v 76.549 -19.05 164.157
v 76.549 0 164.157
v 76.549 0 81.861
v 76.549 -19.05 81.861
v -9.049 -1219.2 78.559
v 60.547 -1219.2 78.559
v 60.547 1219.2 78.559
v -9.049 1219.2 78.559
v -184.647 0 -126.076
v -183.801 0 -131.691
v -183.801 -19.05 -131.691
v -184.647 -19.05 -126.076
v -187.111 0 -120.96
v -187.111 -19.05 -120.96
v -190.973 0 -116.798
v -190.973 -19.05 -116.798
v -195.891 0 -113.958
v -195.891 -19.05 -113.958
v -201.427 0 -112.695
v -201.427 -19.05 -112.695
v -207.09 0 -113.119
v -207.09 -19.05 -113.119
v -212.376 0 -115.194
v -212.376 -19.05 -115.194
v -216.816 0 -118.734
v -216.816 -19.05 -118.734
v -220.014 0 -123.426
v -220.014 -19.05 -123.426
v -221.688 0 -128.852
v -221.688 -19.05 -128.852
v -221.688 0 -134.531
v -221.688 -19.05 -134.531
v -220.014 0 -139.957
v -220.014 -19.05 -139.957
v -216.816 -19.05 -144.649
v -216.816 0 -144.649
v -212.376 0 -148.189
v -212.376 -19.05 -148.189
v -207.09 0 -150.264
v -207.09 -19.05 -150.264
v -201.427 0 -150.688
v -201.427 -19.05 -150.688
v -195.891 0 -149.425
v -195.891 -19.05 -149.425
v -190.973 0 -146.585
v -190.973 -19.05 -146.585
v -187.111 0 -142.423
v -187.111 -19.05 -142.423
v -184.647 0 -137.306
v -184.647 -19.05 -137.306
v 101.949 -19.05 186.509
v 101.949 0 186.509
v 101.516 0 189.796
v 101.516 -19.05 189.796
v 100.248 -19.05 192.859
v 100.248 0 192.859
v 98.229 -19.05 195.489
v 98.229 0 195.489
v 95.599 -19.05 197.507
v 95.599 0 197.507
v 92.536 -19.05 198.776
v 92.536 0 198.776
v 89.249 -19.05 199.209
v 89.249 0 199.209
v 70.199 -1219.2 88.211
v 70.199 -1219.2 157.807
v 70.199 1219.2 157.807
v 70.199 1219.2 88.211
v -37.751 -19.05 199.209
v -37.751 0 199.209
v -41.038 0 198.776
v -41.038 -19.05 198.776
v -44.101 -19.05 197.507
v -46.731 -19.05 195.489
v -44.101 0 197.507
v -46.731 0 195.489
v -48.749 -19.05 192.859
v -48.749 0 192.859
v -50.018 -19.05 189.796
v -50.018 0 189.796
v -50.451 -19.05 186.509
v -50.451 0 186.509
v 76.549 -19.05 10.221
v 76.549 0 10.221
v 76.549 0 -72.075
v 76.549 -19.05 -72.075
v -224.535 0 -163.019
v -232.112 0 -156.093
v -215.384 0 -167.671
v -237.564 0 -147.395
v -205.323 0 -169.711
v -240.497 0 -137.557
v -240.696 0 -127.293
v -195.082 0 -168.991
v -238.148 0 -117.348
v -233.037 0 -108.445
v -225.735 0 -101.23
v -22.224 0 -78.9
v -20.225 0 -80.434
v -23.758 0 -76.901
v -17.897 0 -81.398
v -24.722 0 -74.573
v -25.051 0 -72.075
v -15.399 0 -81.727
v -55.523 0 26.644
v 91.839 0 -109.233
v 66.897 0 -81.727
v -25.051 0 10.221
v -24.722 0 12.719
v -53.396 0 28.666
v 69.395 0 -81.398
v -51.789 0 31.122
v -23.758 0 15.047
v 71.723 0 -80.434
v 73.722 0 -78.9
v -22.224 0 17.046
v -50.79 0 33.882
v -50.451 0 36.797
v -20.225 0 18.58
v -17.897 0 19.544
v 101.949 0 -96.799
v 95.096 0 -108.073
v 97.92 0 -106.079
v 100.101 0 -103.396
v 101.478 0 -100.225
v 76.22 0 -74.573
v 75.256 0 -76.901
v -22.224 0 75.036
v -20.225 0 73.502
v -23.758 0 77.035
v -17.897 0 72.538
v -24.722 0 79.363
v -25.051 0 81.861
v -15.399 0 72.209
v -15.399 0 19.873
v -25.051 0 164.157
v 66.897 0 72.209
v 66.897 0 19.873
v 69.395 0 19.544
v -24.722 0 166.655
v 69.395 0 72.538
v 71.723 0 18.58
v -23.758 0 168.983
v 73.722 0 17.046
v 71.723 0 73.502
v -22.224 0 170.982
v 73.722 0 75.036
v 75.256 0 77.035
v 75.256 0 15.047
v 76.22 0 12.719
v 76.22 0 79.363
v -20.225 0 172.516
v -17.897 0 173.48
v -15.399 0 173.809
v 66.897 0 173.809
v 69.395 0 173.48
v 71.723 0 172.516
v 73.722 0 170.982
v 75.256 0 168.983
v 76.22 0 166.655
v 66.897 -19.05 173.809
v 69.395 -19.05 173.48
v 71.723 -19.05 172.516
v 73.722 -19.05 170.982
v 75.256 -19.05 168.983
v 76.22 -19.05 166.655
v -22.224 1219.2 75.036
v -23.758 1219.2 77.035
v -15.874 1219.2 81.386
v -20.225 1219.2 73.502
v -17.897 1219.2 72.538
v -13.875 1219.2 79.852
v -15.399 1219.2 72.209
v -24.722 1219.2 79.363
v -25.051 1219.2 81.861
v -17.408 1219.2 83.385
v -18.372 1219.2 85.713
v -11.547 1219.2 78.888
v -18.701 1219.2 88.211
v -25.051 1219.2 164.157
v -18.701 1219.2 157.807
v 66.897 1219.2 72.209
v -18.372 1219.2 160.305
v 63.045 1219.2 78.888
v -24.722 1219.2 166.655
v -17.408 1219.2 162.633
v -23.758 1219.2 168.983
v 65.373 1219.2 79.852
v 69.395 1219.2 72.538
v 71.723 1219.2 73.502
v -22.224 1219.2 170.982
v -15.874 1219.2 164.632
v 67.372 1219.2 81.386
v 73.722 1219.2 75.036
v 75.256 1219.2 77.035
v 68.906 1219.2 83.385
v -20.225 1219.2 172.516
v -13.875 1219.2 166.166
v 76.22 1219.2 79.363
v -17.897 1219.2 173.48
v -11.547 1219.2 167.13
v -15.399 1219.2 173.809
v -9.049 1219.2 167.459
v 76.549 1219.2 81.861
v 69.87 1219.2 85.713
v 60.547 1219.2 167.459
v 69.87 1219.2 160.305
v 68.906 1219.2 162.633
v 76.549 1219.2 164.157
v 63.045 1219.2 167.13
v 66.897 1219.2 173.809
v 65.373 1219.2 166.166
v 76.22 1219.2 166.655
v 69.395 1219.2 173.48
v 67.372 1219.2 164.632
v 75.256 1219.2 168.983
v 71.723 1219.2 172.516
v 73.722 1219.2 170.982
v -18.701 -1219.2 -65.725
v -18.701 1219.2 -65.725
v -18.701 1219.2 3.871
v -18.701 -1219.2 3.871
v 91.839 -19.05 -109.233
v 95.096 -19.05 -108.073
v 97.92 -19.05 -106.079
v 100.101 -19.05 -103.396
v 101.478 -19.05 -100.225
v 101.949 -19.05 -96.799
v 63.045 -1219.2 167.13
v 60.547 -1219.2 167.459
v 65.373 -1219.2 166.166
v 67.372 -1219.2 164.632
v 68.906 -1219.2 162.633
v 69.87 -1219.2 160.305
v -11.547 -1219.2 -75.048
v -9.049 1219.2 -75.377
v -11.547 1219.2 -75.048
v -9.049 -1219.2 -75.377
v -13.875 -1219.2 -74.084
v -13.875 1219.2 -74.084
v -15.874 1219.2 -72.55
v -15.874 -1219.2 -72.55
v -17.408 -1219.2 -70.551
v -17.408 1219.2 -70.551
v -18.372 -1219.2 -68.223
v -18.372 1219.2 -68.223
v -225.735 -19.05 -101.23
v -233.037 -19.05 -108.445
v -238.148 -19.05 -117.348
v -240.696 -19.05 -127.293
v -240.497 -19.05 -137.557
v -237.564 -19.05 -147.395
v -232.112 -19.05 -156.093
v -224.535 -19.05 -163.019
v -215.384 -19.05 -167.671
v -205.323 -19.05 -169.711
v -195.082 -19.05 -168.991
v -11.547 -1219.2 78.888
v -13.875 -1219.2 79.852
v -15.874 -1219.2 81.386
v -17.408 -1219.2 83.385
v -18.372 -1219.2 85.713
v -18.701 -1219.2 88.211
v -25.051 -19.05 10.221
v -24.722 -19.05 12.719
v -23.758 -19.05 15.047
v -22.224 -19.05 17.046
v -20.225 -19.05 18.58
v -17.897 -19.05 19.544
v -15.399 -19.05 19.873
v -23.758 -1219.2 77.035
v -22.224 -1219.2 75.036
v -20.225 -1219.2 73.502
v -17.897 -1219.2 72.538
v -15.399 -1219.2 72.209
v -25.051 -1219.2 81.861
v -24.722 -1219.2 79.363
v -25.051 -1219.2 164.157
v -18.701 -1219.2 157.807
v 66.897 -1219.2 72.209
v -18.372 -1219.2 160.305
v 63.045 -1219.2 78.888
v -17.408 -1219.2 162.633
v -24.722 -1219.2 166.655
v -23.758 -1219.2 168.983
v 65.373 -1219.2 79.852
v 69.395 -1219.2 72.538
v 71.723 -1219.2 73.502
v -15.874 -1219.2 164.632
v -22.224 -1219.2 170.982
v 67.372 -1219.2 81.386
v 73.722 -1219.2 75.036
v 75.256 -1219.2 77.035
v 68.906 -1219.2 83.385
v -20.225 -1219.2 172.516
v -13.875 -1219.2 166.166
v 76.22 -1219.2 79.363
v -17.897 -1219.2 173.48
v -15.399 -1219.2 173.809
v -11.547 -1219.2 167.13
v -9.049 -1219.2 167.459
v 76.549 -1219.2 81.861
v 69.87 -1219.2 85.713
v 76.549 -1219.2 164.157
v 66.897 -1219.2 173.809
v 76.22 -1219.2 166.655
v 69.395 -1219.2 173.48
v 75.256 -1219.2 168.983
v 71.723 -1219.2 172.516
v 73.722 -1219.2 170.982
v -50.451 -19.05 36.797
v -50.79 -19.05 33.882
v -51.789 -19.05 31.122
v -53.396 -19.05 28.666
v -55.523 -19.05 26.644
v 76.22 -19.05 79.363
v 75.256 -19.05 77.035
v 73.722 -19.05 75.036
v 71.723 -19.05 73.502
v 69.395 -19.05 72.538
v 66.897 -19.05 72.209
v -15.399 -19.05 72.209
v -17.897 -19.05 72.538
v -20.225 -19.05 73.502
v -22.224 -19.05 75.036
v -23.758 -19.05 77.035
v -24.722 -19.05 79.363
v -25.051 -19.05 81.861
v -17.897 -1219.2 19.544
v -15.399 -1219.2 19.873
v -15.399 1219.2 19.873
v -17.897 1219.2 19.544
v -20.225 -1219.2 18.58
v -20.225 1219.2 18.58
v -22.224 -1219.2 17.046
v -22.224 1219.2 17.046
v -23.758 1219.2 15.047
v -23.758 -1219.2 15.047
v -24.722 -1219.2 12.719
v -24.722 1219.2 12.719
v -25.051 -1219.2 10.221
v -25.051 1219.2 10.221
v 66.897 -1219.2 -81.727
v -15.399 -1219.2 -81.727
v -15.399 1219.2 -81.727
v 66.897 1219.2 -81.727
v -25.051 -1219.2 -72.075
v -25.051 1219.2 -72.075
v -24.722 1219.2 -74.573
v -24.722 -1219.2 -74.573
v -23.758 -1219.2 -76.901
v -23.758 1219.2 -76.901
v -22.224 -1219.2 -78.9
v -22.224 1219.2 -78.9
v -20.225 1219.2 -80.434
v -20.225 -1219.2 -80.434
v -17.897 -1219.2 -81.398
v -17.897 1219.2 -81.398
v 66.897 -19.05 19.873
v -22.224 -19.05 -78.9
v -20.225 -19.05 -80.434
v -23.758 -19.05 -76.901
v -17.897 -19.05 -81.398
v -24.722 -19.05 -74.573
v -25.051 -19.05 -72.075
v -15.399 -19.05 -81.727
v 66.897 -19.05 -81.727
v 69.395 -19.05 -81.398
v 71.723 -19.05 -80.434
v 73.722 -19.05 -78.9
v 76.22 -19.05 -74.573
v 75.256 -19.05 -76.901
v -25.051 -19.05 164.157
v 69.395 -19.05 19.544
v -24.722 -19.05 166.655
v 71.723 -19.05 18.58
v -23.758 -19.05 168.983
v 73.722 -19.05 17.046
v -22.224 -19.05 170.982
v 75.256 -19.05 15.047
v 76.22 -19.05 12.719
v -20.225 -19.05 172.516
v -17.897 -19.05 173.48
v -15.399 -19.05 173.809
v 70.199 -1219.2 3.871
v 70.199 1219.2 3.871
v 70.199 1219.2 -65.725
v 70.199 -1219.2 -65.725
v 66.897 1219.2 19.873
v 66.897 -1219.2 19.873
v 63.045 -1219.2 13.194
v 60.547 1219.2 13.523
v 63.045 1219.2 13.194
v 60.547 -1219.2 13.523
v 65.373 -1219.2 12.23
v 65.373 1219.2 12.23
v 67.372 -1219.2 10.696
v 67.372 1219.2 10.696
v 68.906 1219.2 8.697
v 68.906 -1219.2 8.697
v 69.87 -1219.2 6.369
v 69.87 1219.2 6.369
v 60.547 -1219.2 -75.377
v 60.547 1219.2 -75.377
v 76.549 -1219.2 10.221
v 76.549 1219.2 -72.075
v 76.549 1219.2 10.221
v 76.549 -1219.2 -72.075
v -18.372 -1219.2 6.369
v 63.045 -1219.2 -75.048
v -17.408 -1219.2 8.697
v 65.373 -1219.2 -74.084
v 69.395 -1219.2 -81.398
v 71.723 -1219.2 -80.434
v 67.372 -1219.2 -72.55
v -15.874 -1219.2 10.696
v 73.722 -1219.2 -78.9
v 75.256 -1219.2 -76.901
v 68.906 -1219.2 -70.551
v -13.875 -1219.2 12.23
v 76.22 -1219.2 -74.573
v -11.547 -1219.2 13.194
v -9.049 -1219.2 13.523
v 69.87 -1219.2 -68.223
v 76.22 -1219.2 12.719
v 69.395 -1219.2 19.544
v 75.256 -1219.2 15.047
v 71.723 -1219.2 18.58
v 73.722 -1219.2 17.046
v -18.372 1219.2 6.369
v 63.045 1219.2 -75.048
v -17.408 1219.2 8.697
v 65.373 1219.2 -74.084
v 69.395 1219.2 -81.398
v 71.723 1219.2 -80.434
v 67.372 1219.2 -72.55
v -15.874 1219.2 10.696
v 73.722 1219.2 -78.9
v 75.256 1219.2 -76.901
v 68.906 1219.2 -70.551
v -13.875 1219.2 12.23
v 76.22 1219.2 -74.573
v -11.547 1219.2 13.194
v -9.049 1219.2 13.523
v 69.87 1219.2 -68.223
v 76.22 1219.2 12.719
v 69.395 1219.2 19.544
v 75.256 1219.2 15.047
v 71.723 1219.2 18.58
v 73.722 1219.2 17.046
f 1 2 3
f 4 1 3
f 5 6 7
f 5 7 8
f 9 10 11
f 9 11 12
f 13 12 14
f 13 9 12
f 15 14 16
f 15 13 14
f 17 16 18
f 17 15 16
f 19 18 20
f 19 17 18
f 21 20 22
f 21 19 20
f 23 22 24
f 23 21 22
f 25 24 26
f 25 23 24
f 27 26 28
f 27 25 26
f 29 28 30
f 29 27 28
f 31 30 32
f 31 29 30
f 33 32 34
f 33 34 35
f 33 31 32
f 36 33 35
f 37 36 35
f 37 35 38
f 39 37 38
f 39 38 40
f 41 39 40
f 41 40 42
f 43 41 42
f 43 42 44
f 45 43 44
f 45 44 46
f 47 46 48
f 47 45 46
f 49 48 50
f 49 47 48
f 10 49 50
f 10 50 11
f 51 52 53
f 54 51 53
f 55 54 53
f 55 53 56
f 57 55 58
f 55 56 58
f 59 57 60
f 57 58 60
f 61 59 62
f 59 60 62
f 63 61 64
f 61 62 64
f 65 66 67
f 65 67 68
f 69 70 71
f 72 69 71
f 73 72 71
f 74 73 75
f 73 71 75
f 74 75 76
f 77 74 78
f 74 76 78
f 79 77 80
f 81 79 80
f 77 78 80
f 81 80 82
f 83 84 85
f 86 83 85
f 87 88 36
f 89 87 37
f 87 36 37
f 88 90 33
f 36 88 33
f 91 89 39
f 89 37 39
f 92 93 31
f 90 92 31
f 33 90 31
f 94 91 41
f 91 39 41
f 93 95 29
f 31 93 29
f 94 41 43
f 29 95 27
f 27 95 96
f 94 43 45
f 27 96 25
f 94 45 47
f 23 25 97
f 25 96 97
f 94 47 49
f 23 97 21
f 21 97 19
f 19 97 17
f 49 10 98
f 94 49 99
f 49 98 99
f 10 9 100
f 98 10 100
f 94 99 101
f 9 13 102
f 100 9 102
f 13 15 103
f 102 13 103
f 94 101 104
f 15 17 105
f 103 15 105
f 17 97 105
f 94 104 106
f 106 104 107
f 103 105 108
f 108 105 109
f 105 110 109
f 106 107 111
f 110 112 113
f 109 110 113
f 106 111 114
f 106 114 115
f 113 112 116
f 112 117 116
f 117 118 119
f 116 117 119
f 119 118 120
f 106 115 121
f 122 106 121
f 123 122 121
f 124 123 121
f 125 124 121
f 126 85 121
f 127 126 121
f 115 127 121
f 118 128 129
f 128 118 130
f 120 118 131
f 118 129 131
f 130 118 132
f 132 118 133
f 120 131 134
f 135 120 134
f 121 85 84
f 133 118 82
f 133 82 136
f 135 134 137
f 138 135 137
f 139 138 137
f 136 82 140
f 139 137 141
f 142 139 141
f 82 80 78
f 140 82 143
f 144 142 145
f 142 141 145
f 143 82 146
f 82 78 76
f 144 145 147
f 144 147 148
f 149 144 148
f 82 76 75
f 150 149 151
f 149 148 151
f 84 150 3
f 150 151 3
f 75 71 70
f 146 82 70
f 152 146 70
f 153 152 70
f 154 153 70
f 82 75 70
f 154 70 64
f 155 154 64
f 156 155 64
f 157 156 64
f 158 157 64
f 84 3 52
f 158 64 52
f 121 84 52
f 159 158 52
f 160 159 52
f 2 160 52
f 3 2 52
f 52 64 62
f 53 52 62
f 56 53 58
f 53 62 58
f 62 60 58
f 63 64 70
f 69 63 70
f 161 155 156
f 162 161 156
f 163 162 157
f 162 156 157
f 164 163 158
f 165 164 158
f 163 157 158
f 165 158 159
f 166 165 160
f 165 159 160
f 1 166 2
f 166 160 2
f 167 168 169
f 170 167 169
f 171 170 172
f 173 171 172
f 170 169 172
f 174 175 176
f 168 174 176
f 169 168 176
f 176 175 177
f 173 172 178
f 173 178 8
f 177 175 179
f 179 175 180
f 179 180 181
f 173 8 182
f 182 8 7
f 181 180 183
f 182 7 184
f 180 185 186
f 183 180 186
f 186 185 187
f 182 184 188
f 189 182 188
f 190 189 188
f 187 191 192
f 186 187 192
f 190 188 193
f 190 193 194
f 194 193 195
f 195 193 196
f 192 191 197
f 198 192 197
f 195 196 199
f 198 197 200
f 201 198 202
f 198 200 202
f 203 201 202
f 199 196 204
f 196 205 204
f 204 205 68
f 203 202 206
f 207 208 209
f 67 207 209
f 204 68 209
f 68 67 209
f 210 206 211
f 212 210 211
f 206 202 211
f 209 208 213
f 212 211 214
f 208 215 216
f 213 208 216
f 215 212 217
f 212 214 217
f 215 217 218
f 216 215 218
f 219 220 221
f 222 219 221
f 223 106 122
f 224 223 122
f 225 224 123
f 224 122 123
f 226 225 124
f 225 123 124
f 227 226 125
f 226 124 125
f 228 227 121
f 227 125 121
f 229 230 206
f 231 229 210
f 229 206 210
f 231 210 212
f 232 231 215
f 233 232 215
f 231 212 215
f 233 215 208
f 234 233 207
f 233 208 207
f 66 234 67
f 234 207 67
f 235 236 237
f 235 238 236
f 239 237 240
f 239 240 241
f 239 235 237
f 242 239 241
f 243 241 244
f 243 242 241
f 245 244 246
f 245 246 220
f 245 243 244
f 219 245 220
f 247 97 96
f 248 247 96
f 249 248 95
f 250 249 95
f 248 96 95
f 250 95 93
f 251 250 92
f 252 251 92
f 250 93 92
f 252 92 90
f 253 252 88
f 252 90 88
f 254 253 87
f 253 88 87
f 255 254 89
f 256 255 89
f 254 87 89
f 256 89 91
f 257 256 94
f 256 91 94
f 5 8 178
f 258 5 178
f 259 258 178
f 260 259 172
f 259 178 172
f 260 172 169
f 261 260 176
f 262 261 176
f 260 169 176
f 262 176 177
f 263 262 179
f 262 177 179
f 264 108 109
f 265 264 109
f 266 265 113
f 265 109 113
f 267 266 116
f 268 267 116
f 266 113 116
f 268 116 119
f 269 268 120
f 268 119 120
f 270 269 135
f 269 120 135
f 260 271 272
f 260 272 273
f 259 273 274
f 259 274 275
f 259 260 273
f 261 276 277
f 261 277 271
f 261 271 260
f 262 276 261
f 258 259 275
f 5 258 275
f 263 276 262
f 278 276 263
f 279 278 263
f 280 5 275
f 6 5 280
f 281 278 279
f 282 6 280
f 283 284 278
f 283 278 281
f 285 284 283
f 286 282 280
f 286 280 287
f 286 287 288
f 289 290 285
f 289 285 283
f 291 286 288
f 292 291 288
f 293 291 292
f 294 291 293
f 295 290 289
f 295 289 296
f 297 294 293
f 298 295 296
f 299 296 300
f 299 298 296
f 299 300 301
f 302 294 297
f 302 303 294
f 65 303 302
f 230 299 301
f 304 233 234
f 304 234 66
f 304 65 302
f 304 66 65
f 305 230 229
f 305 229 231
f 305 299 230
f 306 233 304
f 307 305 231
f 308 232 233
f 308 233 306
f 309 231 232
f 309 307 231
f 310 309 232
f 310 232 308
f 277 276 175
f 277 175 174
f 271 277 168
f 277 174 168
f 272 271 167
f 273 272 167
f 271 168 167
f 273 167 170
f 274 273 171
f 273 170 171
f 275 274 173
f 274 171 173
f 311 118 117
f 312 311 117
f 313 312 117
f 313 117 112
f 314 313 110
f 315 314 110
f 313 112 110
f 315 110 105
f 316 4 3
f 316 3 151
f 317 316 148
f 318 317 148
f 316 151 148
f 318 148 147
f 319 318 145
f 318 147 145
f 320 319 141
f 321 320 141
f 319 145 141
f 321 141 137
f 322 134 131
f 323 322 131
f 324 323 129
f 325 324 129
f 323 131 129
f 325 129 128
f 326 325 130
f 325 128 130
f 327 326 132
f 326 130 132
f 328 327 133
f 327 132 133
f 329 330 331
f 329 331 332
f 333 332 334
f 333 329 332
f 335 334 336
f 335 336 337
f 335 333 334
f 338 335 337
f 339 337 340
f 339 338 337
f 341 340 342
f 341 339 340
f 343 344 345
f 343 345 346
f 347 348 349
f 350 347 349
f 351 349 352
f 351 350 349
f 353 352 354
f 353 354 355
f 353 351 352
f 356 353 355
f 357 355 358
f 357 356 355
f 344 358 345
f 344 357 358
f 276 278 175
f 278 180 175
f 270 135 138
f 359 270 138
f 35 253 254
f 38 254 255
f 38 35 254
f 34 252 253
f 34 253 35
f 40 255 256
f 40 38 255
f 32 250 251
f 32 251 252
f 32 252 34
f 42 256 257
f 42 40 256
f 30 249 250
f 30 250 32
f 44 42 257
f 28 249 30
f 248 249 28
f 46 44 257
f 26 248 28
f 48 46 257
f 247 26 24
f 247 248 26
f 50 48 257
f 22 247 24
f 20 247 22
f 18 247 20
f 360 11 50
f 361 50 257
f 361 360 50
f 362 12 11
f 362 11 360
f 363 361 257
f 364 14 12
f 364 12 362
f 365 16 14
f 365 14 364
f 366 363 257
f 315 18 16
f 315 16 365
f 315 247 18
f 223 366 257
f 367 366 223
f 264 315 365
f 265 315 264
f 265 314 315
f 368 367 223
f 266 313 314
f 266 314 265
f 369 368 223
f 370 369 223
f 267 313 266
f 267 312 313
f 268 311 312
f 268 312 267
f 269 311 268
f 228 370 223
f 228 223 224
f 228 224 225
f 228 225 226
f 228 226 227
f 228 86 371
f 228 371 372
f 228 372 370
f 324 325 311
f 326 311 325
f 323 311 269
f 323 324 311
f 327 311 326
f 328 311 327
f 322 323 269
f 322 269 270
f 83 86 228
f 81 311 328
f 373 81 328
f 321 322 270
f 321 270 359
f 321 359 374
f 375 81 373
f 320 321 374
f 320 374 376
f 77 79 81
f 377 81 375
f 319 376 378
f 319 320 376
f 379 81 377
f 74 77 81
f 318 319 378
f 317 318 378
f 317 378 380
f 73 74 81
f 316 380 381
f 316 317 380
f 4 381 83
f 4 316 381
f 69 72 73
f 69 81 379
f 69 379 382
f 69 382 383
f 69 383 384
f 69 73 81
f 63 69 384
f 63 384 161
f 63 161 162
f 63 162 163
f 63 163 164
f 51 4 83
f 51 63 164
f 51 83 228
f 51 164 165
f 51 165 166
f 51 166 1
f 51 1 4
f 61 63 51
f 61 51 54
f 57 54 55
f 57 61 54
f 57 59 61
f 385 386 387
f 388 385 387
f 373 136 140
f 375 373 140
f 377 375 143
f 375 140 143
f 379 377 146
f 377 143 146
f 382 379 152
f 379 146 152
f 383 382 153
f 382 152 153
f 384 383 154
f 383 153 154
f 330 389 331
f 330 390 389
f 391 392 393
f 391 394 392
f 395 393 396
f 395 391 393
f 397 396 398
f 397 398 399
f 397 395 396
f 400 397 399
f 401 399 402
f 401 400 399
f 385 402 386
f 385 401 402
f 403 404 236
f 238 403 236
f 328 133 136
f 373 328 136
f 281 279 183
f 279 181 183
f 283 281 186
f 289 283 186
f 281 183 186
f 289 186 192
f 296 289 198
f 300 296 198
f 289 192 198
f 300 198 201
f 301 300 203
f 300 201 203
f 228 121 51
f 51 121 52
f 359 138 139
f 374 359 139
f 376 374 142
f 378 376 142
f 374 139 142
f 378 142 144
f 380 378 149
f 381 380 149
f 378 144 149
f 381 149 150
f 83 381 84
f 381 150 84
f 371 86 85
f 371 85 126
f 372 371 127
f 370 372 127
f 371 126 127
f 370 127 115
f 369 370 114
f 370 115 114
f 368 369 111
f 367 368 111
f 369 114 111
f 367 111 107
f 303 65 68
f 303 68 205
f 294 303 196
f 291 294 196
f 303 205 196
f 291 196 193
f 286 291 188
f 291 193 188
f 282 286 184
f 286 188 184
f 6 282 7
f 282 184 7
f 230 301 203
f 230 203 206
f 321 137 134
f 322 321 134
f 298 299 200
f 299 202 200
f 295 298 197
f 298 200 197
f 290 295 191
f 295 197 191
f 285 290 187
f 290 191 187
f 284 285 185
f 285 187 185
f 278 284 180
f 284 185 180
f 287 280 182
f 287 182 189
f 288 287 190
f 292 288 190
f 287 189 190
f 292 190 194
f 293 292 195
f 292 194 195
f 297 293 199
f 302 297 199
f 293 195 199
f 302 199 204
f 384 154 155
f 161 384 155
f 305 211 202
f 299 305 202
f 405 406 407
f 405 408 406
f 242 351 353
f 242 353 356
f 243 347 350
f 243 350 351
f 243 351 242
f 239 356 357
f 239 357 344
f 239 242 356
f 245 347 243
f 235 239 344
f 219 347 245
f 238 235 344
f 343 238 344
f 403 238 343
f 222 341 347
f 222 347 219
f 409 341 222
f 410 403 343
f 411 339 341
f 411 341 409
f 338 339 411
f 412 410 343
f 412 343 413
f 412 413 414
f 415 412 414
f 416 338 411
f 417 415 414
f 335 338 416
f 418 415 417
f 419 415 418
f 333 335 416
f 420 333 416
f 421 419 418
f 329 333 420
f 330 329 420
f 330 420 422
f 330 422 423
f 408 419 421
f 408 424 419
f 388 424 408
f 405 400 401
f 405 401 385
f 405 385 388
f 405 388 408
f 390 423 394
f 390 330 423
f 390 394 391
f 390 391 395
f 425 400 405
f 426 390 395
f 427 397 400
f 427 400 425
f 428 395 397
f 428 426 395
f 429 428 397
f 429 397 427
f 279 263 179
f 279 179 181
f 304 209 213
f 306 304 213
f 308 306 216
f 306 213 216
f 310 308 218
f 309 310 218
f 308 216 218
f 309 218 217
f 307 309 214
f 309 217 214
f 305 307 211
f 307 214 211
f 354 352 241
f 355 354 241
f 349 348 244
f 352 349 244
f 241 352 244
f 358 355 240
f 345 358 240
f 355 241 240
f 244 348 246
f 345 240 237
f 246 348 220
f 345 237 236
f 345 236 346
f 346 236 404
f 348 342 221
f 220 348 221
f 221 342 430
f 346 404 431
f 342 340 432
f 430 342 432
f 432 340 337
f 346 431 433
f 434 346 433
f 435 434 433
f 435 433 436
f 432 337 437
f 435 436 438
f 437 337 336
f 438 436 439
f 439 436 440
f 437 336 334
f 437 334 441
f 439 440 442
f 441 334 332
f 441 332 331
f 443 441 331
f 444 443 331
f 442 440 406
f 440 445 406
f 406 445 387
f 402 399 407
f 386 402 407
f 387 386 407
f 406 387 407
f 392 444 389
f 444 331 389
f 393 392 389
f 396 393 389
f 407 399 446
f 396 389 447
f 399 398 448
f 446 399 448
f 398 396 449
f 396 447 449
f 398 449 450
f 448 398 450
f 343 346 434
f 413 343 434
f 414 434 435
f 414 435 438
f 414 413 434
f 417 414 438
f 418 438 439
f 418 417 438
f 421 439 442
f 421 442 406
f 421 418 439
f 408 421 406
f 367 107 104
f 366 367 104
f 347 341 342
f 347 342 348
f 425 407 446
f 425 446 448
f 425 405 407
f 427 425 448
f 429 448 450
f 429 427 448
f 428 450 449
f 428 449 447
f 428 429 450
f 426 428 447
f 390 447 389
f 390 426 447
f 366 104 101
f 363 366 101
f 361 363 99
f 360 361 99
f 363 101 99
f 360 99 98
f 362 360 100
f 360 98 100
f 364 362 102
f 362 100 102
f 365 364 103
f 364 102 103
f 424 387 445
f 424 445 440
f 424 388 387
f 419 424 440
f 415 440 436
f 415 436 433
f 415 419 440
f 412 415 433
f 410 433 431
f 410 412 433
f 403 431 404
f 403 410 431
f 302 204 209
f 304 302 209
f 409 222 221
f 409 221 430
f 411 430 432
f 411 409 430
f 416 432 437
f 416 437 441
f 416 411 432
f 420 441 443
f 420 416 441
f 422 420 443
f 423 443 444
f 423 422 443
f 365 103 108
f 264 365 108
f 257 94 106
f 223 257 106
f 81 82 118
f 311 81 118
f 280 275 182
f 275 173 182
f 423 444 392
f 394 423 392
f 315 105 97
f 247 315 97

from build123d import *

# Parameters (mm, degrees)
F1_DEPTH = 1219.2
F0_R     = 19.05
F2_DEPTH = 19.05


with BuildPart() as f1:
    # F0 (on Front) → F1 (new body, symmetric)
    with BuildSketch(Plane.XZ):
        with BuildLine():
            Line((66.897137, 173.808873), (-15.398863, 173.808873))
            ThreePointArc((-15.398863, 173.808873), (-22.223858, 170.981868), (-25.050863, 164.156873))
            Line((-25.050863, 164.156873), (-25.050863, 81.860873))
            ThreePointArc((-25.050863, 81.860873), (-22.223858, 75.035879), (-15.398863, 72.208873))
            Line((-15.398863, 72.208873), (66.897137, 72.208873))
            ThreePointArc((66.897137, 72.208873), (73.722131, 75.035879), (76.549137, 81.860873))
            Line((76.549137, 81.860873), (76.549137, 164.156873))
            ThreePointArc((76.549137, 164.156873), (73.722131, 170.981868), (66.897137, 173.808873))
        make_face()
        with BuildLine():
            ThreePointArc((-18.700863, 157.806873), (-15.873858, 164.631868), (-9.048863, 167.458873))
            Line((-9.048863, 167.458873), (60.547137, 167.458873))
            ThreePointArc((60.547137, 167.458873), (67.372131, 164.631868), (70.199137, 157.806873))
            Line((70.199137, 157.806873), (70.199137, 88.210873))
            ThreePointArc((70.199137, 88.210873), (67.372131, 81.385879), (60.547137, 78.558873))
            Line((60.547137, 78.558873), (-9.048863, 78.558873))
            ThreePointArc((-9.048863, 78.558873), (-15.873858, 81.385879), (-18.700863, 88.210873))
            Line((-18.700863, 88.210873), (-18.700863, 157.806873))
        make_face(mode=Mode.SUBTRACT)
        with BuildLine():
            Line((66.897137, 19.873195), (-15.398863, 19.873195))
            ThreePointArc((-15.398863, 19.873195), (-22.223858, 17.04619), (-25.050863, 10.221195))
            Line((-25.050863, 10.221195), (-25.050863, -72.074805))
            ThreePointArc((-25.050863, -72.074805), (-22.223858, -78.899799), (-15.398863, -81.726805))
            Line((-15.398863, -81.726805), (66.897137, -81.726805))
            ThreePointArc((66.897137, -81.726805), (73.722131, -78.899799), (76.549137, -72.074805))
            Line((76.549137, -72.074805), (76.549137, 10.221195))
            ThreePointArc((76.549137, 10.221195), (73.722131, 17.04619), (66.897137, 19.873195))
        make_face()
        with BuildLine():
            ThreePointArc((-18.700863, 3.871195), (-15.873858, 10.69619), (-9.048863, 13.523195))
            Line((-9.048863, 13.523195), (60.547137, 13.523195))
            ThreePointArc((60.547137, 13.523195), (67.372131, 10.69619), (70.199137, 3.871195))
            Line((70.199137, 3.871195), (70.199137, -65.724805))
            ThreePointArc((70.199137, -65.724805), (67.372131, -72.549799), (60.547137, -75.376805))
            Line((60.547137, -75.376805), (-9.048863, -75.376805))
            ThreePointArc((-9.048863, -75.376805), (-15.873858, -72.549799), (-18.700863, -65.724805))
            Line((-18.700863, -65.724805), (-18.700863, 3.871195))
        make_face(mode=Mode.SUBTRACT)
    extrude(amount=F1_DEPTH, both=True)


with BuildPart() as f2:
    # F0 (on Front) → F2 (new body)
    with BuildSketch(Plane.XZ):
        with BuildLine():
            Line((89.249137, 199.208873), (-37.750863, 199.208873))
            ThreePointArc((-37.750863, 199.208873), (-46.731119, 195.489129), (-50.450863, 186.508873))
            Line((-50.450863, 186.508873), (-50.450863, 36.797381))
            ThreePointArc((-50.450863, 36.797381), (-51.789357, 31.122332), (-55.522703, 26.643506))
            Line((-55.522703, 26.643506), (-225.735343, -101.229772))
            ThreePointArc((-225.735343, -101.229772), (-237.564236, -147.394637), (-195.082296, -168.990986))
            Line((-195.082296, -168.990986), (91.838659, -109.232563))
            ThreePointArc((91.838659, -109.232563), (99.102485, -104.811953), (101.949137, -96.799367))
            Line((101.949137, -96.799367), (101.949137, 186.508873))
            ThreePointArc((101.949137, 186.508873), (98.229393, 195.489129), (89.249137, 199.208873))
        make_face()
        with Locations((-202.850863, -131.691396)):
            Circle(F0_R, mode=Mode.SUBTRACT)
        with BuildLine():
            ThreePointArc((-25.050863, 10.221195), (-22.223858, 17.04619), (-15.398863, 19.873195))
            Line((-15.398863, 19.873195), (66.897137, 19.873195))
            ThreePointArc((66.897137, 19.873195), (73.722131, 17.04619), (76.549137, 10.221195))
            Line((76.549137, 10.221195), (76.549137, -72.074805))
            ThreePointArc((76.549137, -72.074805), (73.722131, -78.899799), (66.897137, -81.726805))
            Line((66.897137, -81.726805), (-15.398863, -81.726805))
            ThreePointArc((-15.398863, -81.726805), (-22.223858, -78.899799), (-25.050863, -72.074805))
            Line((-25.050863, -72.074805), (-25.050863, 10.221195))
        make_face(mode=Mode.SUBTRACT)
        with BuildLine():
            ThreePointArc((-25.050863, 164.156873), (-22.223858, 170.981868), (-15.398863, 173.808873))
            Line((-15.398863, 173.808873), (66.897137, 173.808873))
            ThreePointArc((66.897137, 173.808873), (73.722131, 170.981868), (76.549137, 164.156873))
            Line((76.549137, 164.156873), (76.549137, 81.860873))
            ThreePointArc((76.549137, 81.860873), (73.722131, 75.035879), (66.897137, 72.208873))
            Line((66.897137, 72.208873), (-15.398863, 72.208873))
            ThreePointArc((-15.398863, 72.208873), (-22.223858, 75.035879), (-25.050863, 81.860873))
            Line((-25.050863, 81.860873), (-25.050863, 164.156873))
        make_face(mode=Mode.SUBTRACT)
    extrude(amount=F2_DEPTH)


solid = Compound([f1.part, f2.part])
